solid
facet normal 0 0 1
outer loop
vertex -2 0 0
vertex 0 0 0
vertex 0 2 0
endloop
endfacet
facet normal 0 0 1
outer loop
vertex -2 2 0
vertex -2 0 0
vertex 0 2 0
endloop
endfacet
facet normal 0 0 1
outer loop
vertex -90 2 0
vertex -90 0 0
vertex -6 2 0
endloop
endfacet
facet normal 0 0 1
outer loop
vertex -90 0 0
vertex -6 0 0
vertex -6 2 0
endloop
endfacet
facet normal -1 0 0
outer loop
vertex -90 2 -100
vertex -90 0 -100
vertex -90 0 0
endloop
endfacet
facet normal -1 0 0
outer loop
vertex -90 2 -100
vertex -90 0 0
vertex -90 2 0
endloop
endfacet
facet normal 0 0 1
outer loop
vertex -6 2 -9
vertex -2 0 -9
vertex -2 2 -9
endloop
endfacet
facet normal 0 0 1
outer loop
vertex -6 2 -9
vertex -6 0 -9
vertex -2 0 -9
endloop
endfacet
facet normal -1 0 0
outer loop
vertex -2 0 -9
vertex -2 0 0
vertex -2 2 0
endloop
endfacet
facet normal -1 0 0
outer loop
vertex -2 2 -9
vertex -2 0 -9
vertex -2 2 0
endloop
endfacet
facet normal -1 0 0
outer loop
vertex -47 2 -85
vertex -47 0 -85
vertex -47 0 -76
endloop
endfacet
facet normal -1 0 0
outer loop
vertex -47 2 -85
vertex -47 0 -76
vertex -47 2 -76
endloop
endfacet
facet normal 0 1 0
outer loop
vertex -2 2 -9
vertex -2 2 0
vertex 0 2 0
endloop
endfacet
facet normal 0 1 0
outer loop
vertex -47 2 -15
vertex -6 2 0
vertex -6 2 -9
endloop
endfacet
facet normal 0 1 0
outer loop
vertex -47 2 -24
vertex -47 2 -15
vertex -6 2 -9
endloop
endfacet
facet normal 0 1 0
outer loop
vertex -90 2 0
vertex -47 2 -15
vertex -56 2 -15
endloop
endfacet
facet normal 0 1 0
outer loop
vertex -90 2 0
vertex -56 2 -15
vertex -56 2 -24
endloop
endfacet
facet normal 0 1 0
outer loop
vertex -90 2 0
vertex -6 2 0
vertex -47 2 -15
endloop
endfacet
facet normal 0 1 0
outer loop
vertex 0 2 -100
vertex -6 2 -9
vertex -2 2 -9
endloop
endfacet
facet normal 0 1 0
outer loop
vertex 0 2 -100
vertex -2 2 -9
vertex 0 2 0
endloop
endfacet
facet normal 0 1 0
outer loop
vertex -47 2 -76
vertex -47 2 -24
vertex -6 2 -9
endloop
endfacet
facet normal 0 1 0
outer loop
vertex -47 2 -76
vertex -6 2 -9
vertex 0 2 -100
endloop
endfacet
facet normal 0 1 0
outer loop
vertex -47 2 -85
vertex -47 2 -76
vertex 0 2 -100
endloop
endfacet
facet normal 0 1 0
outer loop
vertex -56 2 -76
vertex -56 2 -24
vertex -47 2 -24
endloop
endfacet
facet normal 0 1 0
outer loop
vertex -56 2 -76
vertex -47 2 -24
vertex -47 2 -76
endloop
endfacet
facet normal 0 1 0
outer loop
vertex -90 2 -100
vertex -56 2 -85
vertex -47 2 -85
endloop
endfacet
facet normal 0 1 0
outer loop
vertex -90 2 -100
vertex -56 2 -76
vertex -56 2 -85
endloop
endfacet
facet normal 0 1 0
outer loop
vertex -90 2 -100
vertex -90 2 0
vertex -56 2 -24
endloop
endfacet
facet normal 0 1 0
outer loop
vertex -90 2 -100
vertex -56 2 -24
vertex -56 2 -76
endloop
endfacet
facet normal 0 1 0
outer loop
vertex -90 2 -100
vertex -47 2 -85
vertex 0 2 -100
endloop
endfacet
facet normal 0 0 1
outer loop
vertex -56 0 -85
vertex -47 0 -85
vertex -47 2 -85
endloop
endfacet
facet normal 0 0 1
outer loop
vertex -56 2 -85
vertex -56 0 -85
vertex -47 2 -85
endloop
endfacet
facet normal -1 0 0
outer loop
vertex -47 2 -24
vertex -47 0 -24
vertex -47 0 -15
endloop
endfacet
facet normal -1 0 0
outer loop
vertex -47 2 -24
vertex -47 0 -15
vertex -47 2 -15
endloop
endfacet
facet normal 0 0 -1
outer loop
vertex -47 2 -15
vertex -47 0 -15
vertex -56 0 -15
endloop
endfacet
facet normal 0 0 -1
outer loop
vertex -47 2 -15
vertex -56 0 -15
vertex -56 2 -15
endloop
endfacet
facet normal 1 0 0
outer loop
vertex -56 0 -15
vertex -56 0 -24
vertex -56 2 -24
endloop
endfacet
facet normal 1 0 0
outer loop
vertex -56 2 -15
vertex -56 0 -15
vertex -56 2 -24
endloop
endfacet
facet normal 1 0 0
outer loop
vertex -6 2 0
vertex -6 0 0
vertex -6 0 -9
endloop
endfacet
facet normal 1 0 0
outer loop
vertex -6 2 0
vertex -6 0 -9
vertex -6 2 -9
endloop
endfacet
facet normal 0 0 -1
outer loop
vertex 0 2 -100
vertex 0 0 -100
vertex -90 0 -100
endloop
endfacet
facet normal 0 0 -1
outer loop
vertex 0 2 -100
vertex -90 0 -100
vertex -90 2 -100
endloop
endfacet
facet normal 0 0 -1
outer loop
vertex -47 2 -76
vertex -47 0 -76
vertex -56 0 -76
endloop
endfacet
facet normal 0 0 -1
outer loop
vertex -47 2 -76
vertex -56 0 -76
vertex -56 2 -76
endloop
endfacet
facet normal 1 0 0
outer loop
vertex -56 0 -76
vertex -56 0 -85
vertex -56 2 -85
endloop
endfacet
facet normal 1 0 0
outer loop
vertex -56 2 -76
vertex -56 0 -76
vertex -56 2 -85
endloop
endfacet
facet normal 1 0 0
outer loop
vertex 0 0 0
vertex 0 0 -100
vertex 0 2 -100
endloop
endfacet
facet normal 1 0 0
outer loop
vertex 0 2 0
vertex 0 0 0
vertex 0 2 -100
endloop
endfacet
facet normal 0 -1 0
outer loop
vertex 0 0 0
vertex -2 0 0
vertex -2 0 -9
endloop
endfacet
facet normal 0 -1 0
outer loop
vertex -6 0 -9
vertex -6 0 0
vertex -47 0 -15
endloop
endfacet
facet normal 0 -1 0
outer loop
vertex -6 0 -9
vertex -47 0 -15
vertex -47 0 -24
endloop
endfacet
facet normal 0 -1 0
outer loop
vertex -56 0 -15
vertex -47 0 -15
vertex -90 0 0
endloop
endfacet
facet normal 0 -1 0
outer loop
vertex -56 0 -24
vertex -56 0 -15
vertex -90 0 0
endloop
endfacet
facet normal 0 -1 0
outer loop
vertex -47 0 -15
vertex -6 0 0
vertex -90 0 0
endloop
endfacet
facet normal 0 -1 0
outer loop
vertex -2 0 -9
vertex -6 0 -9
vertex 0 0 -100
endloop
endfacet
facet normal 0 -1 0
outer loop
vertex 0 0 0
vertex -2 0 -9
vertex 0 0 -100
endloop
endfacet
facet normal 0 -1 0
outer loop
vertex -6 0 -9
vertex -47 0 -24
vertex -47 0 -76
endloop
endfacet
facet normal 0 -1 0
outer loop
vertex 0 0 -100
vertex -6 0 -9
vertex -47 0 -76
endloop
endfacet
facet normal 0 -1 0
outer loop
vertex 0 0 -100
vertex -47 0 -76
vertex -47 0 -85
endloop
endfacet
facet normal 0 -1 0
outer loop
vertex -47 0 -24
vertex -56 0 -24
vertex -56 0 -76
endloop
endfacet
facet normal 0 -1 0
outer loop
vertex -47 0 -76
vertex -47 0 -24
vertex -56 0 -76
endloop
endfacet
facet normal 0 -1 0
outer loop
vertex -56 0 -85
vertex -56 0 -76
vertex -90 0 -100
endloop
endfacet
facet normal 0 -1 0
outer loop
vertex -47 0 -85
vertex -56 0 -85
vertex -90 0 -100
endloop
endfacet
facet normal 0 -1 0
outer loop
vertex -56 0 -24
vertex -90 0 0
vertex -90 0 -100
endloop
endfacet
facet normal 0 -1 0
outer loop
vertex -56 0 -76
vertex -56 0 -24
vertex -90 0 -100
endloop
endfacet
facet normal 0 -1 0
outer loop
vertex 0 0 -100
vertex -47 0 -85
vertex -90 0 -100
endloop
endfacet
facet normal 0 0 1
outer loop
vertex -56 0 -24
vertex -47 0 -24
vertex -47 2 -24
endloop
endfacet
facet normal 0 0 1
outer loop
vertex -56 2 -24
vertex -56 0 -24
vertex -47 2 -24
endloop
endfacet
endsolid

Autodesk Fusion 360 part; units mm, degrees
box "BoxPrimitive5" add length 100 width 90 height 2 placed x (0, 0, -1) y (-1, 0, 0) z (0, 1, 0) at (0, 0, 0)
box "BoxPrimitive6" cut length 9 width 4 height -14 placed x (0, 0, 1) y (1, 0, 0) z (0, 1, 0) at (-6, 2, -9)
box "BoxPrimitive7" cut length 9 width 9 height -11 placed x (0, 0, -1) y (-1, 0, 0) z (0, 1, 0) at (-47, 2, -15)
box "BoxPrimitive8" cut length 9 width 9 height -10 placed x (0, 0, -1) y (-1, 0, 0) z (0, 1, 0) at (-47, 2, -76)
